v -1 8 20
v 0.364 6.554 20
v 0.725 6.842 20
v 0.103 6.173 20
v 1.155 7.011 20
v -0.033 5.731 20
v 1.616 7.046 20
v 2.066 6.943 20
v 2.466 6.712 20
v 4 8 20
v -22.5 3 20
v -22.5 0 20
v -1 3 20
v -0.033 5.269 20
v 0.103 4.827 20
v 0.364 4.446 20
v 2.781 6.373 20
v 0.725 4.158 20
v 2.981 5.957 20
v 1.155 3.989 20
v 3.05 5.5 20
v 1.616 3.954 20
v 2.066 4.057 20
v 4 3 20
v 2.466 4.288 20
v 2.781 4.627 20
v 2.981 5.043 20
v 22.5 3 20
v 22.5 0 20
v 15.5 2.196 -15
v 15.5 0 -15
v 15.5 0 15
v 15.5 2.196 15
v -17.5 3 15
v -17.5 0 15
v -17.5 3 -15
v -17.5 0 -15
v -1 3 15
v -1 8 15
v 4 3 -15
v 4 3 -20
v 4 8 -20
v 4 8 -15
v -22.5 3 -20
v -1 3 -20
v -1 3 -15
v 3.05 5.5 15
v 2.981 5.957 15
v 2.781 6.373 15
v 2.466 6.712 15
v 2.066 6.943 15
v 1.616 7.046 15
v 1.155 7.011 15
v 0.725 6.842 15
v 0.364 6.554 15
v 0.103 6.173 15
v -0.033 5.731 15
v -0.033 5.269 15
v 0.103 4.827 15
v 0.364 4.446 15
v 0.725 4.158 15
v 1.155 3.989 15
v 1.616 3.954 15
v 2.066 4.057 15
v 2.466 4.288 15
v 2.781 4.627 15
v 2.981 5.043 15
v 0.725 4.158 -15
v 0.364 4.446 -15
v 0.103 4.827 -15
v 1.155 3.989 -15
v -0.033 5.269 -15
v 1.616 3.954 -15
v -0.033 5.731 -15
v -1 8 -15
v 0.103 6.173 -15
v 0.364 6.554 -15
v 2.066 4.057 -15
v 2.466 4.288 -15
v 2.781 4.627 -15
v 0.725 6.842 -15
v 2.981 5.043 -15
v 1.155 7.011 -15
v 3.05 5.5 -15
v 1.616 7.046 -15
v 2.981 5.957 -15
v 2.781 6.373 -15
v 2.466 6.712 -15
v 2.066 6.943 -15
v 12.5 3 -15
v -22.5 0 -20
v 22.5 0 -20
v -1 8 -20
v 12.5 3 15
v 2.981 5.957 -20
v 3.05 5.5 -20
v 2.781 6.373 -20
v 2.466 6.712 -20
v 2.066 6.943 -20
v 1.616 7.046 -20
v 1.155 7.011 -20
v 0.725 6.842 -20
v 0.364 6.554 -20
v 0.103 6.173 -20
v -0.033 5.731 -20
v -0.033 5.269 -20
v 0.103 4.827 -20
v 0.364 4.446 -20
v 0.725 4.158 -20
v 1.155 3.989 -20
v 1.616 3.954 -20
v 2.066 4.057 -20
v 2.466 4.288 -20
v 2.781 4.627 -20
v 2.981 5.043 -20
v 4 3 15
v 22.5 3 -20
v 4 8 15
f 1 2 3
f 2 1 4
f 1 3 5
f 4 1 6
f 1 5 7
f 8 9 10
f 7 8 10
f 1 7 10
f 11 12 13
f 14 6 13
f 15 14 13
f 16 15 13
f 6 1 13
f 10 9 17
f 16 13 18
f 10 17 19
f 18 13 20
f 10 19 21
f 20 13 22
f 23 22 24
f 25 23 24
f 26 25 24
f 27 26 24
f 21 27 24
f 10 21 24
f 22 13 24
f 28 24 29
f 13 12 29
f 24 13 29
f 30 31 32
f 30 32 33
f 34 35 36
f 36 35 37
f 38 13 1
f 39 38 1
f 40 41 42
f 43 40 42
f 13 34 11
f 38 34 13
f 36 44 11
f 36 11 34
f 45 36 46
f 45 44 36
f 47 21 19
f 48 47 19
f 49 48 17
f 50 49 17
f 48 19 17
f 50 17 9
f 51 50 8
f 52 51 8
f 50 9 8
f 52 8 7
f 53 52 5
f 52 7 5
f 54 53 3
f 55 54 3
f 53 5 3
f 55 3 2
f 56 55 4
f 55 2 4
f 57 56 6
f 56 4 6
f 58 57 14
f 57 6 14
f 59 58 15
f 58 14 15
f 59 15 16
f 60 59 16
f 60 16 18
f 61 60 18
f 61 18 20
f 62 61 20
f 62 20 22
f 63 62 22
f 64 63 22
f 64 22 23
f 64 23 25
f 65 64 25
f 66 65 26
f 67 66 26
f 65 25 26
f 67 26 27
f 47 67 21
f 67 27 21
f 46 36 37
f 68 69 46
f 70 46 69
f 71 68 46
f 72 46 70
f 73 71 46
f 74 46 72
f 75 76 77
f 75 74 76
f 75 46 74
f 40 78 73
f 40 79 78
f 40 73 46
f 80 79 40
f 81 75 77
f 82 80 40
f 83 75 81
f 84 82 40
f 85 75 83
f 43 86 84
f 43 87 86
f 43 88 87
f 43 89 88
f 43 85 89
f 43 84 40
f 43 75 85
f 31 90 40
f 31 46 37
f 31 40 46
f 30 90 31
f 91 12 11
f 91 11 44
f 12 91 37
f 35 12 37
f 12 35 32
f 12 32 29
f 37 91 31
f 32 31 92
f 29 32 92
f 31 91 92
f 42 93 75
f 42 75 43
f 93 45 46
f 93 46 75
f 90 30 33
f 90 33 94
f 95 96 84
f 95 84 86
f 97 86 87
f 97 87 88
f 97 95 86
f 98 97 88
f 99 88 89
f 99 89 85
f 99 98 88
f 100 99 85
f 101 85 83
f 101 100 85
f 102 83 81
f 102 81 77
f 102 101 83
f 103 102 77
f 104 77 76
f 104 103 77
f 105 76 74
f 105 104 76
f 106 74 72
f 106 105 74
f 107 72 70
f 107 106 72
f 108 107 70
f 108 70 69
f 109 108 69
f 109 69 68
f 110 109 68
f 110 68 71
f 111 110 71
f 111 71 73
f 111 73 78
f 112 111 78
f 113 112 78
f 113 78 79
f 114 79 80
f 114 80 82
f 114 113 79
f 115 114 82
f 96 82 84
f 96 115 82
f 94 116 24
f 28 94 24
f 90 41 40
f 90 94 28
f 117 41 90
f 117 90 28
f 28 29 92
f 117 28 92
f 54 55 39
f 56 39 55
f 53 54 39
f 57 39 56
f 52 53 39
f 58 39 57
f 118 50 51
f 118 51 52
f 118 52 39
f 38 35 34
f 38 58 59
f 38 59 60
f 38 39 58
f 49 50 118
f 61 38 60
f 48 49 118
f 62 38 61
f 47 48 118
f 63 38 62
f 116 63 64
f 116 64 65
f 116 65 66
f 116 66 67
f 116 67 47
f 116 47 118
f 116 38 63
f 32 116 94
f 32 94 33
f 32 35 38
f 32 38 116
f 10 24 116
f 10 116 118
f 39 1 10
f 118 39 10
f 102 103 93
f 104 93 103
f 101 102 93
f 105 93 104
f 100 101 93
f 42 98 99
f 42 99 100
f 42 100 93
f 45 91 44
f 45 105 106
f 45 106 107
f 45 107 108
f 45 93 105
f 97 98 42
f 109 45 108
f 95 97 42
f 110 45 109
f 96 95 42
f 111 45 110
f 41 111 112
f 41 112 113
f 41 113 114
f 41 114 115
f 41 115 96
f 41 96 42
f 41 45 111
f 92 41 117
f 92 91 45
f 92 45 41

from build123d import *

# Parameters (mm, degrees)
SKETCH_1_W          = 45
SKETCH_1_H          = 40
SKETCH_1_W_2        = 30
SKETCH_1_H_2        = 30
EXTRUDE_2_DEPTH     = 3
CUT_EXTRUDE_2_DEPTH = 30
SKETCH_3_W          = 5
SKETCH_3_H          = 5
SKETCH_3_R          = 1.55
EXTRUDE_3_DEPTH     = 5


with BuildPart() as part:
    # 草图1 → 凸台-拉伸2 (new body)
    with BuildSketch(Plane(origin=(0, 0, 0), x_dir=(1, 0, 0), z_dir=(0, 1, 0))):
        Rectangle(SKETCH_1_W, SKETCH_1_H)
        with Locations((-2.5, 0)):
            Rectangle(SKETCH_1_W_2, SKETCH_1_H_2, mode=Mode.SUBTRACT)
    extrude(amount=EXTRUDE_2_DEPTH)

    # 草图2 → 切除-拉伸2 (cut)
    with BuildSketch(Plane.XY.offset(-15)):
        Polygon((12.5, 0), (15.5, 0), (15.5, 2.196152423), (12.5, 3), align=None)
    extrude(amount=CUT_EXTRUDE_2_DEPTH, mode=Mode.SUBTRACT)

    # 草图3 → 凸台-拉伸3 (add)
    with BuildSketch(Plane.XY.offset(20)):
        with Locations((1.5, 5.5)):
            Rectangle(SKETCH_3_W, SKETCH_3_H)
        with Locations((1.5, 5.5)):
            Circle(SKETCH_3_R, mode=Mode.SUBTRACT)
    extrude_3 = extrude(amount=-EXTRUDE_3_DEPTH)

    # 镜向2: 凸台-拉伸3 across plane
    add(extrude_3.mirror(Plane(origin=(0, 0, 0), x_dir=(1, 0, 0), z_dir=(0, 0, -1))))


solid = part.part
